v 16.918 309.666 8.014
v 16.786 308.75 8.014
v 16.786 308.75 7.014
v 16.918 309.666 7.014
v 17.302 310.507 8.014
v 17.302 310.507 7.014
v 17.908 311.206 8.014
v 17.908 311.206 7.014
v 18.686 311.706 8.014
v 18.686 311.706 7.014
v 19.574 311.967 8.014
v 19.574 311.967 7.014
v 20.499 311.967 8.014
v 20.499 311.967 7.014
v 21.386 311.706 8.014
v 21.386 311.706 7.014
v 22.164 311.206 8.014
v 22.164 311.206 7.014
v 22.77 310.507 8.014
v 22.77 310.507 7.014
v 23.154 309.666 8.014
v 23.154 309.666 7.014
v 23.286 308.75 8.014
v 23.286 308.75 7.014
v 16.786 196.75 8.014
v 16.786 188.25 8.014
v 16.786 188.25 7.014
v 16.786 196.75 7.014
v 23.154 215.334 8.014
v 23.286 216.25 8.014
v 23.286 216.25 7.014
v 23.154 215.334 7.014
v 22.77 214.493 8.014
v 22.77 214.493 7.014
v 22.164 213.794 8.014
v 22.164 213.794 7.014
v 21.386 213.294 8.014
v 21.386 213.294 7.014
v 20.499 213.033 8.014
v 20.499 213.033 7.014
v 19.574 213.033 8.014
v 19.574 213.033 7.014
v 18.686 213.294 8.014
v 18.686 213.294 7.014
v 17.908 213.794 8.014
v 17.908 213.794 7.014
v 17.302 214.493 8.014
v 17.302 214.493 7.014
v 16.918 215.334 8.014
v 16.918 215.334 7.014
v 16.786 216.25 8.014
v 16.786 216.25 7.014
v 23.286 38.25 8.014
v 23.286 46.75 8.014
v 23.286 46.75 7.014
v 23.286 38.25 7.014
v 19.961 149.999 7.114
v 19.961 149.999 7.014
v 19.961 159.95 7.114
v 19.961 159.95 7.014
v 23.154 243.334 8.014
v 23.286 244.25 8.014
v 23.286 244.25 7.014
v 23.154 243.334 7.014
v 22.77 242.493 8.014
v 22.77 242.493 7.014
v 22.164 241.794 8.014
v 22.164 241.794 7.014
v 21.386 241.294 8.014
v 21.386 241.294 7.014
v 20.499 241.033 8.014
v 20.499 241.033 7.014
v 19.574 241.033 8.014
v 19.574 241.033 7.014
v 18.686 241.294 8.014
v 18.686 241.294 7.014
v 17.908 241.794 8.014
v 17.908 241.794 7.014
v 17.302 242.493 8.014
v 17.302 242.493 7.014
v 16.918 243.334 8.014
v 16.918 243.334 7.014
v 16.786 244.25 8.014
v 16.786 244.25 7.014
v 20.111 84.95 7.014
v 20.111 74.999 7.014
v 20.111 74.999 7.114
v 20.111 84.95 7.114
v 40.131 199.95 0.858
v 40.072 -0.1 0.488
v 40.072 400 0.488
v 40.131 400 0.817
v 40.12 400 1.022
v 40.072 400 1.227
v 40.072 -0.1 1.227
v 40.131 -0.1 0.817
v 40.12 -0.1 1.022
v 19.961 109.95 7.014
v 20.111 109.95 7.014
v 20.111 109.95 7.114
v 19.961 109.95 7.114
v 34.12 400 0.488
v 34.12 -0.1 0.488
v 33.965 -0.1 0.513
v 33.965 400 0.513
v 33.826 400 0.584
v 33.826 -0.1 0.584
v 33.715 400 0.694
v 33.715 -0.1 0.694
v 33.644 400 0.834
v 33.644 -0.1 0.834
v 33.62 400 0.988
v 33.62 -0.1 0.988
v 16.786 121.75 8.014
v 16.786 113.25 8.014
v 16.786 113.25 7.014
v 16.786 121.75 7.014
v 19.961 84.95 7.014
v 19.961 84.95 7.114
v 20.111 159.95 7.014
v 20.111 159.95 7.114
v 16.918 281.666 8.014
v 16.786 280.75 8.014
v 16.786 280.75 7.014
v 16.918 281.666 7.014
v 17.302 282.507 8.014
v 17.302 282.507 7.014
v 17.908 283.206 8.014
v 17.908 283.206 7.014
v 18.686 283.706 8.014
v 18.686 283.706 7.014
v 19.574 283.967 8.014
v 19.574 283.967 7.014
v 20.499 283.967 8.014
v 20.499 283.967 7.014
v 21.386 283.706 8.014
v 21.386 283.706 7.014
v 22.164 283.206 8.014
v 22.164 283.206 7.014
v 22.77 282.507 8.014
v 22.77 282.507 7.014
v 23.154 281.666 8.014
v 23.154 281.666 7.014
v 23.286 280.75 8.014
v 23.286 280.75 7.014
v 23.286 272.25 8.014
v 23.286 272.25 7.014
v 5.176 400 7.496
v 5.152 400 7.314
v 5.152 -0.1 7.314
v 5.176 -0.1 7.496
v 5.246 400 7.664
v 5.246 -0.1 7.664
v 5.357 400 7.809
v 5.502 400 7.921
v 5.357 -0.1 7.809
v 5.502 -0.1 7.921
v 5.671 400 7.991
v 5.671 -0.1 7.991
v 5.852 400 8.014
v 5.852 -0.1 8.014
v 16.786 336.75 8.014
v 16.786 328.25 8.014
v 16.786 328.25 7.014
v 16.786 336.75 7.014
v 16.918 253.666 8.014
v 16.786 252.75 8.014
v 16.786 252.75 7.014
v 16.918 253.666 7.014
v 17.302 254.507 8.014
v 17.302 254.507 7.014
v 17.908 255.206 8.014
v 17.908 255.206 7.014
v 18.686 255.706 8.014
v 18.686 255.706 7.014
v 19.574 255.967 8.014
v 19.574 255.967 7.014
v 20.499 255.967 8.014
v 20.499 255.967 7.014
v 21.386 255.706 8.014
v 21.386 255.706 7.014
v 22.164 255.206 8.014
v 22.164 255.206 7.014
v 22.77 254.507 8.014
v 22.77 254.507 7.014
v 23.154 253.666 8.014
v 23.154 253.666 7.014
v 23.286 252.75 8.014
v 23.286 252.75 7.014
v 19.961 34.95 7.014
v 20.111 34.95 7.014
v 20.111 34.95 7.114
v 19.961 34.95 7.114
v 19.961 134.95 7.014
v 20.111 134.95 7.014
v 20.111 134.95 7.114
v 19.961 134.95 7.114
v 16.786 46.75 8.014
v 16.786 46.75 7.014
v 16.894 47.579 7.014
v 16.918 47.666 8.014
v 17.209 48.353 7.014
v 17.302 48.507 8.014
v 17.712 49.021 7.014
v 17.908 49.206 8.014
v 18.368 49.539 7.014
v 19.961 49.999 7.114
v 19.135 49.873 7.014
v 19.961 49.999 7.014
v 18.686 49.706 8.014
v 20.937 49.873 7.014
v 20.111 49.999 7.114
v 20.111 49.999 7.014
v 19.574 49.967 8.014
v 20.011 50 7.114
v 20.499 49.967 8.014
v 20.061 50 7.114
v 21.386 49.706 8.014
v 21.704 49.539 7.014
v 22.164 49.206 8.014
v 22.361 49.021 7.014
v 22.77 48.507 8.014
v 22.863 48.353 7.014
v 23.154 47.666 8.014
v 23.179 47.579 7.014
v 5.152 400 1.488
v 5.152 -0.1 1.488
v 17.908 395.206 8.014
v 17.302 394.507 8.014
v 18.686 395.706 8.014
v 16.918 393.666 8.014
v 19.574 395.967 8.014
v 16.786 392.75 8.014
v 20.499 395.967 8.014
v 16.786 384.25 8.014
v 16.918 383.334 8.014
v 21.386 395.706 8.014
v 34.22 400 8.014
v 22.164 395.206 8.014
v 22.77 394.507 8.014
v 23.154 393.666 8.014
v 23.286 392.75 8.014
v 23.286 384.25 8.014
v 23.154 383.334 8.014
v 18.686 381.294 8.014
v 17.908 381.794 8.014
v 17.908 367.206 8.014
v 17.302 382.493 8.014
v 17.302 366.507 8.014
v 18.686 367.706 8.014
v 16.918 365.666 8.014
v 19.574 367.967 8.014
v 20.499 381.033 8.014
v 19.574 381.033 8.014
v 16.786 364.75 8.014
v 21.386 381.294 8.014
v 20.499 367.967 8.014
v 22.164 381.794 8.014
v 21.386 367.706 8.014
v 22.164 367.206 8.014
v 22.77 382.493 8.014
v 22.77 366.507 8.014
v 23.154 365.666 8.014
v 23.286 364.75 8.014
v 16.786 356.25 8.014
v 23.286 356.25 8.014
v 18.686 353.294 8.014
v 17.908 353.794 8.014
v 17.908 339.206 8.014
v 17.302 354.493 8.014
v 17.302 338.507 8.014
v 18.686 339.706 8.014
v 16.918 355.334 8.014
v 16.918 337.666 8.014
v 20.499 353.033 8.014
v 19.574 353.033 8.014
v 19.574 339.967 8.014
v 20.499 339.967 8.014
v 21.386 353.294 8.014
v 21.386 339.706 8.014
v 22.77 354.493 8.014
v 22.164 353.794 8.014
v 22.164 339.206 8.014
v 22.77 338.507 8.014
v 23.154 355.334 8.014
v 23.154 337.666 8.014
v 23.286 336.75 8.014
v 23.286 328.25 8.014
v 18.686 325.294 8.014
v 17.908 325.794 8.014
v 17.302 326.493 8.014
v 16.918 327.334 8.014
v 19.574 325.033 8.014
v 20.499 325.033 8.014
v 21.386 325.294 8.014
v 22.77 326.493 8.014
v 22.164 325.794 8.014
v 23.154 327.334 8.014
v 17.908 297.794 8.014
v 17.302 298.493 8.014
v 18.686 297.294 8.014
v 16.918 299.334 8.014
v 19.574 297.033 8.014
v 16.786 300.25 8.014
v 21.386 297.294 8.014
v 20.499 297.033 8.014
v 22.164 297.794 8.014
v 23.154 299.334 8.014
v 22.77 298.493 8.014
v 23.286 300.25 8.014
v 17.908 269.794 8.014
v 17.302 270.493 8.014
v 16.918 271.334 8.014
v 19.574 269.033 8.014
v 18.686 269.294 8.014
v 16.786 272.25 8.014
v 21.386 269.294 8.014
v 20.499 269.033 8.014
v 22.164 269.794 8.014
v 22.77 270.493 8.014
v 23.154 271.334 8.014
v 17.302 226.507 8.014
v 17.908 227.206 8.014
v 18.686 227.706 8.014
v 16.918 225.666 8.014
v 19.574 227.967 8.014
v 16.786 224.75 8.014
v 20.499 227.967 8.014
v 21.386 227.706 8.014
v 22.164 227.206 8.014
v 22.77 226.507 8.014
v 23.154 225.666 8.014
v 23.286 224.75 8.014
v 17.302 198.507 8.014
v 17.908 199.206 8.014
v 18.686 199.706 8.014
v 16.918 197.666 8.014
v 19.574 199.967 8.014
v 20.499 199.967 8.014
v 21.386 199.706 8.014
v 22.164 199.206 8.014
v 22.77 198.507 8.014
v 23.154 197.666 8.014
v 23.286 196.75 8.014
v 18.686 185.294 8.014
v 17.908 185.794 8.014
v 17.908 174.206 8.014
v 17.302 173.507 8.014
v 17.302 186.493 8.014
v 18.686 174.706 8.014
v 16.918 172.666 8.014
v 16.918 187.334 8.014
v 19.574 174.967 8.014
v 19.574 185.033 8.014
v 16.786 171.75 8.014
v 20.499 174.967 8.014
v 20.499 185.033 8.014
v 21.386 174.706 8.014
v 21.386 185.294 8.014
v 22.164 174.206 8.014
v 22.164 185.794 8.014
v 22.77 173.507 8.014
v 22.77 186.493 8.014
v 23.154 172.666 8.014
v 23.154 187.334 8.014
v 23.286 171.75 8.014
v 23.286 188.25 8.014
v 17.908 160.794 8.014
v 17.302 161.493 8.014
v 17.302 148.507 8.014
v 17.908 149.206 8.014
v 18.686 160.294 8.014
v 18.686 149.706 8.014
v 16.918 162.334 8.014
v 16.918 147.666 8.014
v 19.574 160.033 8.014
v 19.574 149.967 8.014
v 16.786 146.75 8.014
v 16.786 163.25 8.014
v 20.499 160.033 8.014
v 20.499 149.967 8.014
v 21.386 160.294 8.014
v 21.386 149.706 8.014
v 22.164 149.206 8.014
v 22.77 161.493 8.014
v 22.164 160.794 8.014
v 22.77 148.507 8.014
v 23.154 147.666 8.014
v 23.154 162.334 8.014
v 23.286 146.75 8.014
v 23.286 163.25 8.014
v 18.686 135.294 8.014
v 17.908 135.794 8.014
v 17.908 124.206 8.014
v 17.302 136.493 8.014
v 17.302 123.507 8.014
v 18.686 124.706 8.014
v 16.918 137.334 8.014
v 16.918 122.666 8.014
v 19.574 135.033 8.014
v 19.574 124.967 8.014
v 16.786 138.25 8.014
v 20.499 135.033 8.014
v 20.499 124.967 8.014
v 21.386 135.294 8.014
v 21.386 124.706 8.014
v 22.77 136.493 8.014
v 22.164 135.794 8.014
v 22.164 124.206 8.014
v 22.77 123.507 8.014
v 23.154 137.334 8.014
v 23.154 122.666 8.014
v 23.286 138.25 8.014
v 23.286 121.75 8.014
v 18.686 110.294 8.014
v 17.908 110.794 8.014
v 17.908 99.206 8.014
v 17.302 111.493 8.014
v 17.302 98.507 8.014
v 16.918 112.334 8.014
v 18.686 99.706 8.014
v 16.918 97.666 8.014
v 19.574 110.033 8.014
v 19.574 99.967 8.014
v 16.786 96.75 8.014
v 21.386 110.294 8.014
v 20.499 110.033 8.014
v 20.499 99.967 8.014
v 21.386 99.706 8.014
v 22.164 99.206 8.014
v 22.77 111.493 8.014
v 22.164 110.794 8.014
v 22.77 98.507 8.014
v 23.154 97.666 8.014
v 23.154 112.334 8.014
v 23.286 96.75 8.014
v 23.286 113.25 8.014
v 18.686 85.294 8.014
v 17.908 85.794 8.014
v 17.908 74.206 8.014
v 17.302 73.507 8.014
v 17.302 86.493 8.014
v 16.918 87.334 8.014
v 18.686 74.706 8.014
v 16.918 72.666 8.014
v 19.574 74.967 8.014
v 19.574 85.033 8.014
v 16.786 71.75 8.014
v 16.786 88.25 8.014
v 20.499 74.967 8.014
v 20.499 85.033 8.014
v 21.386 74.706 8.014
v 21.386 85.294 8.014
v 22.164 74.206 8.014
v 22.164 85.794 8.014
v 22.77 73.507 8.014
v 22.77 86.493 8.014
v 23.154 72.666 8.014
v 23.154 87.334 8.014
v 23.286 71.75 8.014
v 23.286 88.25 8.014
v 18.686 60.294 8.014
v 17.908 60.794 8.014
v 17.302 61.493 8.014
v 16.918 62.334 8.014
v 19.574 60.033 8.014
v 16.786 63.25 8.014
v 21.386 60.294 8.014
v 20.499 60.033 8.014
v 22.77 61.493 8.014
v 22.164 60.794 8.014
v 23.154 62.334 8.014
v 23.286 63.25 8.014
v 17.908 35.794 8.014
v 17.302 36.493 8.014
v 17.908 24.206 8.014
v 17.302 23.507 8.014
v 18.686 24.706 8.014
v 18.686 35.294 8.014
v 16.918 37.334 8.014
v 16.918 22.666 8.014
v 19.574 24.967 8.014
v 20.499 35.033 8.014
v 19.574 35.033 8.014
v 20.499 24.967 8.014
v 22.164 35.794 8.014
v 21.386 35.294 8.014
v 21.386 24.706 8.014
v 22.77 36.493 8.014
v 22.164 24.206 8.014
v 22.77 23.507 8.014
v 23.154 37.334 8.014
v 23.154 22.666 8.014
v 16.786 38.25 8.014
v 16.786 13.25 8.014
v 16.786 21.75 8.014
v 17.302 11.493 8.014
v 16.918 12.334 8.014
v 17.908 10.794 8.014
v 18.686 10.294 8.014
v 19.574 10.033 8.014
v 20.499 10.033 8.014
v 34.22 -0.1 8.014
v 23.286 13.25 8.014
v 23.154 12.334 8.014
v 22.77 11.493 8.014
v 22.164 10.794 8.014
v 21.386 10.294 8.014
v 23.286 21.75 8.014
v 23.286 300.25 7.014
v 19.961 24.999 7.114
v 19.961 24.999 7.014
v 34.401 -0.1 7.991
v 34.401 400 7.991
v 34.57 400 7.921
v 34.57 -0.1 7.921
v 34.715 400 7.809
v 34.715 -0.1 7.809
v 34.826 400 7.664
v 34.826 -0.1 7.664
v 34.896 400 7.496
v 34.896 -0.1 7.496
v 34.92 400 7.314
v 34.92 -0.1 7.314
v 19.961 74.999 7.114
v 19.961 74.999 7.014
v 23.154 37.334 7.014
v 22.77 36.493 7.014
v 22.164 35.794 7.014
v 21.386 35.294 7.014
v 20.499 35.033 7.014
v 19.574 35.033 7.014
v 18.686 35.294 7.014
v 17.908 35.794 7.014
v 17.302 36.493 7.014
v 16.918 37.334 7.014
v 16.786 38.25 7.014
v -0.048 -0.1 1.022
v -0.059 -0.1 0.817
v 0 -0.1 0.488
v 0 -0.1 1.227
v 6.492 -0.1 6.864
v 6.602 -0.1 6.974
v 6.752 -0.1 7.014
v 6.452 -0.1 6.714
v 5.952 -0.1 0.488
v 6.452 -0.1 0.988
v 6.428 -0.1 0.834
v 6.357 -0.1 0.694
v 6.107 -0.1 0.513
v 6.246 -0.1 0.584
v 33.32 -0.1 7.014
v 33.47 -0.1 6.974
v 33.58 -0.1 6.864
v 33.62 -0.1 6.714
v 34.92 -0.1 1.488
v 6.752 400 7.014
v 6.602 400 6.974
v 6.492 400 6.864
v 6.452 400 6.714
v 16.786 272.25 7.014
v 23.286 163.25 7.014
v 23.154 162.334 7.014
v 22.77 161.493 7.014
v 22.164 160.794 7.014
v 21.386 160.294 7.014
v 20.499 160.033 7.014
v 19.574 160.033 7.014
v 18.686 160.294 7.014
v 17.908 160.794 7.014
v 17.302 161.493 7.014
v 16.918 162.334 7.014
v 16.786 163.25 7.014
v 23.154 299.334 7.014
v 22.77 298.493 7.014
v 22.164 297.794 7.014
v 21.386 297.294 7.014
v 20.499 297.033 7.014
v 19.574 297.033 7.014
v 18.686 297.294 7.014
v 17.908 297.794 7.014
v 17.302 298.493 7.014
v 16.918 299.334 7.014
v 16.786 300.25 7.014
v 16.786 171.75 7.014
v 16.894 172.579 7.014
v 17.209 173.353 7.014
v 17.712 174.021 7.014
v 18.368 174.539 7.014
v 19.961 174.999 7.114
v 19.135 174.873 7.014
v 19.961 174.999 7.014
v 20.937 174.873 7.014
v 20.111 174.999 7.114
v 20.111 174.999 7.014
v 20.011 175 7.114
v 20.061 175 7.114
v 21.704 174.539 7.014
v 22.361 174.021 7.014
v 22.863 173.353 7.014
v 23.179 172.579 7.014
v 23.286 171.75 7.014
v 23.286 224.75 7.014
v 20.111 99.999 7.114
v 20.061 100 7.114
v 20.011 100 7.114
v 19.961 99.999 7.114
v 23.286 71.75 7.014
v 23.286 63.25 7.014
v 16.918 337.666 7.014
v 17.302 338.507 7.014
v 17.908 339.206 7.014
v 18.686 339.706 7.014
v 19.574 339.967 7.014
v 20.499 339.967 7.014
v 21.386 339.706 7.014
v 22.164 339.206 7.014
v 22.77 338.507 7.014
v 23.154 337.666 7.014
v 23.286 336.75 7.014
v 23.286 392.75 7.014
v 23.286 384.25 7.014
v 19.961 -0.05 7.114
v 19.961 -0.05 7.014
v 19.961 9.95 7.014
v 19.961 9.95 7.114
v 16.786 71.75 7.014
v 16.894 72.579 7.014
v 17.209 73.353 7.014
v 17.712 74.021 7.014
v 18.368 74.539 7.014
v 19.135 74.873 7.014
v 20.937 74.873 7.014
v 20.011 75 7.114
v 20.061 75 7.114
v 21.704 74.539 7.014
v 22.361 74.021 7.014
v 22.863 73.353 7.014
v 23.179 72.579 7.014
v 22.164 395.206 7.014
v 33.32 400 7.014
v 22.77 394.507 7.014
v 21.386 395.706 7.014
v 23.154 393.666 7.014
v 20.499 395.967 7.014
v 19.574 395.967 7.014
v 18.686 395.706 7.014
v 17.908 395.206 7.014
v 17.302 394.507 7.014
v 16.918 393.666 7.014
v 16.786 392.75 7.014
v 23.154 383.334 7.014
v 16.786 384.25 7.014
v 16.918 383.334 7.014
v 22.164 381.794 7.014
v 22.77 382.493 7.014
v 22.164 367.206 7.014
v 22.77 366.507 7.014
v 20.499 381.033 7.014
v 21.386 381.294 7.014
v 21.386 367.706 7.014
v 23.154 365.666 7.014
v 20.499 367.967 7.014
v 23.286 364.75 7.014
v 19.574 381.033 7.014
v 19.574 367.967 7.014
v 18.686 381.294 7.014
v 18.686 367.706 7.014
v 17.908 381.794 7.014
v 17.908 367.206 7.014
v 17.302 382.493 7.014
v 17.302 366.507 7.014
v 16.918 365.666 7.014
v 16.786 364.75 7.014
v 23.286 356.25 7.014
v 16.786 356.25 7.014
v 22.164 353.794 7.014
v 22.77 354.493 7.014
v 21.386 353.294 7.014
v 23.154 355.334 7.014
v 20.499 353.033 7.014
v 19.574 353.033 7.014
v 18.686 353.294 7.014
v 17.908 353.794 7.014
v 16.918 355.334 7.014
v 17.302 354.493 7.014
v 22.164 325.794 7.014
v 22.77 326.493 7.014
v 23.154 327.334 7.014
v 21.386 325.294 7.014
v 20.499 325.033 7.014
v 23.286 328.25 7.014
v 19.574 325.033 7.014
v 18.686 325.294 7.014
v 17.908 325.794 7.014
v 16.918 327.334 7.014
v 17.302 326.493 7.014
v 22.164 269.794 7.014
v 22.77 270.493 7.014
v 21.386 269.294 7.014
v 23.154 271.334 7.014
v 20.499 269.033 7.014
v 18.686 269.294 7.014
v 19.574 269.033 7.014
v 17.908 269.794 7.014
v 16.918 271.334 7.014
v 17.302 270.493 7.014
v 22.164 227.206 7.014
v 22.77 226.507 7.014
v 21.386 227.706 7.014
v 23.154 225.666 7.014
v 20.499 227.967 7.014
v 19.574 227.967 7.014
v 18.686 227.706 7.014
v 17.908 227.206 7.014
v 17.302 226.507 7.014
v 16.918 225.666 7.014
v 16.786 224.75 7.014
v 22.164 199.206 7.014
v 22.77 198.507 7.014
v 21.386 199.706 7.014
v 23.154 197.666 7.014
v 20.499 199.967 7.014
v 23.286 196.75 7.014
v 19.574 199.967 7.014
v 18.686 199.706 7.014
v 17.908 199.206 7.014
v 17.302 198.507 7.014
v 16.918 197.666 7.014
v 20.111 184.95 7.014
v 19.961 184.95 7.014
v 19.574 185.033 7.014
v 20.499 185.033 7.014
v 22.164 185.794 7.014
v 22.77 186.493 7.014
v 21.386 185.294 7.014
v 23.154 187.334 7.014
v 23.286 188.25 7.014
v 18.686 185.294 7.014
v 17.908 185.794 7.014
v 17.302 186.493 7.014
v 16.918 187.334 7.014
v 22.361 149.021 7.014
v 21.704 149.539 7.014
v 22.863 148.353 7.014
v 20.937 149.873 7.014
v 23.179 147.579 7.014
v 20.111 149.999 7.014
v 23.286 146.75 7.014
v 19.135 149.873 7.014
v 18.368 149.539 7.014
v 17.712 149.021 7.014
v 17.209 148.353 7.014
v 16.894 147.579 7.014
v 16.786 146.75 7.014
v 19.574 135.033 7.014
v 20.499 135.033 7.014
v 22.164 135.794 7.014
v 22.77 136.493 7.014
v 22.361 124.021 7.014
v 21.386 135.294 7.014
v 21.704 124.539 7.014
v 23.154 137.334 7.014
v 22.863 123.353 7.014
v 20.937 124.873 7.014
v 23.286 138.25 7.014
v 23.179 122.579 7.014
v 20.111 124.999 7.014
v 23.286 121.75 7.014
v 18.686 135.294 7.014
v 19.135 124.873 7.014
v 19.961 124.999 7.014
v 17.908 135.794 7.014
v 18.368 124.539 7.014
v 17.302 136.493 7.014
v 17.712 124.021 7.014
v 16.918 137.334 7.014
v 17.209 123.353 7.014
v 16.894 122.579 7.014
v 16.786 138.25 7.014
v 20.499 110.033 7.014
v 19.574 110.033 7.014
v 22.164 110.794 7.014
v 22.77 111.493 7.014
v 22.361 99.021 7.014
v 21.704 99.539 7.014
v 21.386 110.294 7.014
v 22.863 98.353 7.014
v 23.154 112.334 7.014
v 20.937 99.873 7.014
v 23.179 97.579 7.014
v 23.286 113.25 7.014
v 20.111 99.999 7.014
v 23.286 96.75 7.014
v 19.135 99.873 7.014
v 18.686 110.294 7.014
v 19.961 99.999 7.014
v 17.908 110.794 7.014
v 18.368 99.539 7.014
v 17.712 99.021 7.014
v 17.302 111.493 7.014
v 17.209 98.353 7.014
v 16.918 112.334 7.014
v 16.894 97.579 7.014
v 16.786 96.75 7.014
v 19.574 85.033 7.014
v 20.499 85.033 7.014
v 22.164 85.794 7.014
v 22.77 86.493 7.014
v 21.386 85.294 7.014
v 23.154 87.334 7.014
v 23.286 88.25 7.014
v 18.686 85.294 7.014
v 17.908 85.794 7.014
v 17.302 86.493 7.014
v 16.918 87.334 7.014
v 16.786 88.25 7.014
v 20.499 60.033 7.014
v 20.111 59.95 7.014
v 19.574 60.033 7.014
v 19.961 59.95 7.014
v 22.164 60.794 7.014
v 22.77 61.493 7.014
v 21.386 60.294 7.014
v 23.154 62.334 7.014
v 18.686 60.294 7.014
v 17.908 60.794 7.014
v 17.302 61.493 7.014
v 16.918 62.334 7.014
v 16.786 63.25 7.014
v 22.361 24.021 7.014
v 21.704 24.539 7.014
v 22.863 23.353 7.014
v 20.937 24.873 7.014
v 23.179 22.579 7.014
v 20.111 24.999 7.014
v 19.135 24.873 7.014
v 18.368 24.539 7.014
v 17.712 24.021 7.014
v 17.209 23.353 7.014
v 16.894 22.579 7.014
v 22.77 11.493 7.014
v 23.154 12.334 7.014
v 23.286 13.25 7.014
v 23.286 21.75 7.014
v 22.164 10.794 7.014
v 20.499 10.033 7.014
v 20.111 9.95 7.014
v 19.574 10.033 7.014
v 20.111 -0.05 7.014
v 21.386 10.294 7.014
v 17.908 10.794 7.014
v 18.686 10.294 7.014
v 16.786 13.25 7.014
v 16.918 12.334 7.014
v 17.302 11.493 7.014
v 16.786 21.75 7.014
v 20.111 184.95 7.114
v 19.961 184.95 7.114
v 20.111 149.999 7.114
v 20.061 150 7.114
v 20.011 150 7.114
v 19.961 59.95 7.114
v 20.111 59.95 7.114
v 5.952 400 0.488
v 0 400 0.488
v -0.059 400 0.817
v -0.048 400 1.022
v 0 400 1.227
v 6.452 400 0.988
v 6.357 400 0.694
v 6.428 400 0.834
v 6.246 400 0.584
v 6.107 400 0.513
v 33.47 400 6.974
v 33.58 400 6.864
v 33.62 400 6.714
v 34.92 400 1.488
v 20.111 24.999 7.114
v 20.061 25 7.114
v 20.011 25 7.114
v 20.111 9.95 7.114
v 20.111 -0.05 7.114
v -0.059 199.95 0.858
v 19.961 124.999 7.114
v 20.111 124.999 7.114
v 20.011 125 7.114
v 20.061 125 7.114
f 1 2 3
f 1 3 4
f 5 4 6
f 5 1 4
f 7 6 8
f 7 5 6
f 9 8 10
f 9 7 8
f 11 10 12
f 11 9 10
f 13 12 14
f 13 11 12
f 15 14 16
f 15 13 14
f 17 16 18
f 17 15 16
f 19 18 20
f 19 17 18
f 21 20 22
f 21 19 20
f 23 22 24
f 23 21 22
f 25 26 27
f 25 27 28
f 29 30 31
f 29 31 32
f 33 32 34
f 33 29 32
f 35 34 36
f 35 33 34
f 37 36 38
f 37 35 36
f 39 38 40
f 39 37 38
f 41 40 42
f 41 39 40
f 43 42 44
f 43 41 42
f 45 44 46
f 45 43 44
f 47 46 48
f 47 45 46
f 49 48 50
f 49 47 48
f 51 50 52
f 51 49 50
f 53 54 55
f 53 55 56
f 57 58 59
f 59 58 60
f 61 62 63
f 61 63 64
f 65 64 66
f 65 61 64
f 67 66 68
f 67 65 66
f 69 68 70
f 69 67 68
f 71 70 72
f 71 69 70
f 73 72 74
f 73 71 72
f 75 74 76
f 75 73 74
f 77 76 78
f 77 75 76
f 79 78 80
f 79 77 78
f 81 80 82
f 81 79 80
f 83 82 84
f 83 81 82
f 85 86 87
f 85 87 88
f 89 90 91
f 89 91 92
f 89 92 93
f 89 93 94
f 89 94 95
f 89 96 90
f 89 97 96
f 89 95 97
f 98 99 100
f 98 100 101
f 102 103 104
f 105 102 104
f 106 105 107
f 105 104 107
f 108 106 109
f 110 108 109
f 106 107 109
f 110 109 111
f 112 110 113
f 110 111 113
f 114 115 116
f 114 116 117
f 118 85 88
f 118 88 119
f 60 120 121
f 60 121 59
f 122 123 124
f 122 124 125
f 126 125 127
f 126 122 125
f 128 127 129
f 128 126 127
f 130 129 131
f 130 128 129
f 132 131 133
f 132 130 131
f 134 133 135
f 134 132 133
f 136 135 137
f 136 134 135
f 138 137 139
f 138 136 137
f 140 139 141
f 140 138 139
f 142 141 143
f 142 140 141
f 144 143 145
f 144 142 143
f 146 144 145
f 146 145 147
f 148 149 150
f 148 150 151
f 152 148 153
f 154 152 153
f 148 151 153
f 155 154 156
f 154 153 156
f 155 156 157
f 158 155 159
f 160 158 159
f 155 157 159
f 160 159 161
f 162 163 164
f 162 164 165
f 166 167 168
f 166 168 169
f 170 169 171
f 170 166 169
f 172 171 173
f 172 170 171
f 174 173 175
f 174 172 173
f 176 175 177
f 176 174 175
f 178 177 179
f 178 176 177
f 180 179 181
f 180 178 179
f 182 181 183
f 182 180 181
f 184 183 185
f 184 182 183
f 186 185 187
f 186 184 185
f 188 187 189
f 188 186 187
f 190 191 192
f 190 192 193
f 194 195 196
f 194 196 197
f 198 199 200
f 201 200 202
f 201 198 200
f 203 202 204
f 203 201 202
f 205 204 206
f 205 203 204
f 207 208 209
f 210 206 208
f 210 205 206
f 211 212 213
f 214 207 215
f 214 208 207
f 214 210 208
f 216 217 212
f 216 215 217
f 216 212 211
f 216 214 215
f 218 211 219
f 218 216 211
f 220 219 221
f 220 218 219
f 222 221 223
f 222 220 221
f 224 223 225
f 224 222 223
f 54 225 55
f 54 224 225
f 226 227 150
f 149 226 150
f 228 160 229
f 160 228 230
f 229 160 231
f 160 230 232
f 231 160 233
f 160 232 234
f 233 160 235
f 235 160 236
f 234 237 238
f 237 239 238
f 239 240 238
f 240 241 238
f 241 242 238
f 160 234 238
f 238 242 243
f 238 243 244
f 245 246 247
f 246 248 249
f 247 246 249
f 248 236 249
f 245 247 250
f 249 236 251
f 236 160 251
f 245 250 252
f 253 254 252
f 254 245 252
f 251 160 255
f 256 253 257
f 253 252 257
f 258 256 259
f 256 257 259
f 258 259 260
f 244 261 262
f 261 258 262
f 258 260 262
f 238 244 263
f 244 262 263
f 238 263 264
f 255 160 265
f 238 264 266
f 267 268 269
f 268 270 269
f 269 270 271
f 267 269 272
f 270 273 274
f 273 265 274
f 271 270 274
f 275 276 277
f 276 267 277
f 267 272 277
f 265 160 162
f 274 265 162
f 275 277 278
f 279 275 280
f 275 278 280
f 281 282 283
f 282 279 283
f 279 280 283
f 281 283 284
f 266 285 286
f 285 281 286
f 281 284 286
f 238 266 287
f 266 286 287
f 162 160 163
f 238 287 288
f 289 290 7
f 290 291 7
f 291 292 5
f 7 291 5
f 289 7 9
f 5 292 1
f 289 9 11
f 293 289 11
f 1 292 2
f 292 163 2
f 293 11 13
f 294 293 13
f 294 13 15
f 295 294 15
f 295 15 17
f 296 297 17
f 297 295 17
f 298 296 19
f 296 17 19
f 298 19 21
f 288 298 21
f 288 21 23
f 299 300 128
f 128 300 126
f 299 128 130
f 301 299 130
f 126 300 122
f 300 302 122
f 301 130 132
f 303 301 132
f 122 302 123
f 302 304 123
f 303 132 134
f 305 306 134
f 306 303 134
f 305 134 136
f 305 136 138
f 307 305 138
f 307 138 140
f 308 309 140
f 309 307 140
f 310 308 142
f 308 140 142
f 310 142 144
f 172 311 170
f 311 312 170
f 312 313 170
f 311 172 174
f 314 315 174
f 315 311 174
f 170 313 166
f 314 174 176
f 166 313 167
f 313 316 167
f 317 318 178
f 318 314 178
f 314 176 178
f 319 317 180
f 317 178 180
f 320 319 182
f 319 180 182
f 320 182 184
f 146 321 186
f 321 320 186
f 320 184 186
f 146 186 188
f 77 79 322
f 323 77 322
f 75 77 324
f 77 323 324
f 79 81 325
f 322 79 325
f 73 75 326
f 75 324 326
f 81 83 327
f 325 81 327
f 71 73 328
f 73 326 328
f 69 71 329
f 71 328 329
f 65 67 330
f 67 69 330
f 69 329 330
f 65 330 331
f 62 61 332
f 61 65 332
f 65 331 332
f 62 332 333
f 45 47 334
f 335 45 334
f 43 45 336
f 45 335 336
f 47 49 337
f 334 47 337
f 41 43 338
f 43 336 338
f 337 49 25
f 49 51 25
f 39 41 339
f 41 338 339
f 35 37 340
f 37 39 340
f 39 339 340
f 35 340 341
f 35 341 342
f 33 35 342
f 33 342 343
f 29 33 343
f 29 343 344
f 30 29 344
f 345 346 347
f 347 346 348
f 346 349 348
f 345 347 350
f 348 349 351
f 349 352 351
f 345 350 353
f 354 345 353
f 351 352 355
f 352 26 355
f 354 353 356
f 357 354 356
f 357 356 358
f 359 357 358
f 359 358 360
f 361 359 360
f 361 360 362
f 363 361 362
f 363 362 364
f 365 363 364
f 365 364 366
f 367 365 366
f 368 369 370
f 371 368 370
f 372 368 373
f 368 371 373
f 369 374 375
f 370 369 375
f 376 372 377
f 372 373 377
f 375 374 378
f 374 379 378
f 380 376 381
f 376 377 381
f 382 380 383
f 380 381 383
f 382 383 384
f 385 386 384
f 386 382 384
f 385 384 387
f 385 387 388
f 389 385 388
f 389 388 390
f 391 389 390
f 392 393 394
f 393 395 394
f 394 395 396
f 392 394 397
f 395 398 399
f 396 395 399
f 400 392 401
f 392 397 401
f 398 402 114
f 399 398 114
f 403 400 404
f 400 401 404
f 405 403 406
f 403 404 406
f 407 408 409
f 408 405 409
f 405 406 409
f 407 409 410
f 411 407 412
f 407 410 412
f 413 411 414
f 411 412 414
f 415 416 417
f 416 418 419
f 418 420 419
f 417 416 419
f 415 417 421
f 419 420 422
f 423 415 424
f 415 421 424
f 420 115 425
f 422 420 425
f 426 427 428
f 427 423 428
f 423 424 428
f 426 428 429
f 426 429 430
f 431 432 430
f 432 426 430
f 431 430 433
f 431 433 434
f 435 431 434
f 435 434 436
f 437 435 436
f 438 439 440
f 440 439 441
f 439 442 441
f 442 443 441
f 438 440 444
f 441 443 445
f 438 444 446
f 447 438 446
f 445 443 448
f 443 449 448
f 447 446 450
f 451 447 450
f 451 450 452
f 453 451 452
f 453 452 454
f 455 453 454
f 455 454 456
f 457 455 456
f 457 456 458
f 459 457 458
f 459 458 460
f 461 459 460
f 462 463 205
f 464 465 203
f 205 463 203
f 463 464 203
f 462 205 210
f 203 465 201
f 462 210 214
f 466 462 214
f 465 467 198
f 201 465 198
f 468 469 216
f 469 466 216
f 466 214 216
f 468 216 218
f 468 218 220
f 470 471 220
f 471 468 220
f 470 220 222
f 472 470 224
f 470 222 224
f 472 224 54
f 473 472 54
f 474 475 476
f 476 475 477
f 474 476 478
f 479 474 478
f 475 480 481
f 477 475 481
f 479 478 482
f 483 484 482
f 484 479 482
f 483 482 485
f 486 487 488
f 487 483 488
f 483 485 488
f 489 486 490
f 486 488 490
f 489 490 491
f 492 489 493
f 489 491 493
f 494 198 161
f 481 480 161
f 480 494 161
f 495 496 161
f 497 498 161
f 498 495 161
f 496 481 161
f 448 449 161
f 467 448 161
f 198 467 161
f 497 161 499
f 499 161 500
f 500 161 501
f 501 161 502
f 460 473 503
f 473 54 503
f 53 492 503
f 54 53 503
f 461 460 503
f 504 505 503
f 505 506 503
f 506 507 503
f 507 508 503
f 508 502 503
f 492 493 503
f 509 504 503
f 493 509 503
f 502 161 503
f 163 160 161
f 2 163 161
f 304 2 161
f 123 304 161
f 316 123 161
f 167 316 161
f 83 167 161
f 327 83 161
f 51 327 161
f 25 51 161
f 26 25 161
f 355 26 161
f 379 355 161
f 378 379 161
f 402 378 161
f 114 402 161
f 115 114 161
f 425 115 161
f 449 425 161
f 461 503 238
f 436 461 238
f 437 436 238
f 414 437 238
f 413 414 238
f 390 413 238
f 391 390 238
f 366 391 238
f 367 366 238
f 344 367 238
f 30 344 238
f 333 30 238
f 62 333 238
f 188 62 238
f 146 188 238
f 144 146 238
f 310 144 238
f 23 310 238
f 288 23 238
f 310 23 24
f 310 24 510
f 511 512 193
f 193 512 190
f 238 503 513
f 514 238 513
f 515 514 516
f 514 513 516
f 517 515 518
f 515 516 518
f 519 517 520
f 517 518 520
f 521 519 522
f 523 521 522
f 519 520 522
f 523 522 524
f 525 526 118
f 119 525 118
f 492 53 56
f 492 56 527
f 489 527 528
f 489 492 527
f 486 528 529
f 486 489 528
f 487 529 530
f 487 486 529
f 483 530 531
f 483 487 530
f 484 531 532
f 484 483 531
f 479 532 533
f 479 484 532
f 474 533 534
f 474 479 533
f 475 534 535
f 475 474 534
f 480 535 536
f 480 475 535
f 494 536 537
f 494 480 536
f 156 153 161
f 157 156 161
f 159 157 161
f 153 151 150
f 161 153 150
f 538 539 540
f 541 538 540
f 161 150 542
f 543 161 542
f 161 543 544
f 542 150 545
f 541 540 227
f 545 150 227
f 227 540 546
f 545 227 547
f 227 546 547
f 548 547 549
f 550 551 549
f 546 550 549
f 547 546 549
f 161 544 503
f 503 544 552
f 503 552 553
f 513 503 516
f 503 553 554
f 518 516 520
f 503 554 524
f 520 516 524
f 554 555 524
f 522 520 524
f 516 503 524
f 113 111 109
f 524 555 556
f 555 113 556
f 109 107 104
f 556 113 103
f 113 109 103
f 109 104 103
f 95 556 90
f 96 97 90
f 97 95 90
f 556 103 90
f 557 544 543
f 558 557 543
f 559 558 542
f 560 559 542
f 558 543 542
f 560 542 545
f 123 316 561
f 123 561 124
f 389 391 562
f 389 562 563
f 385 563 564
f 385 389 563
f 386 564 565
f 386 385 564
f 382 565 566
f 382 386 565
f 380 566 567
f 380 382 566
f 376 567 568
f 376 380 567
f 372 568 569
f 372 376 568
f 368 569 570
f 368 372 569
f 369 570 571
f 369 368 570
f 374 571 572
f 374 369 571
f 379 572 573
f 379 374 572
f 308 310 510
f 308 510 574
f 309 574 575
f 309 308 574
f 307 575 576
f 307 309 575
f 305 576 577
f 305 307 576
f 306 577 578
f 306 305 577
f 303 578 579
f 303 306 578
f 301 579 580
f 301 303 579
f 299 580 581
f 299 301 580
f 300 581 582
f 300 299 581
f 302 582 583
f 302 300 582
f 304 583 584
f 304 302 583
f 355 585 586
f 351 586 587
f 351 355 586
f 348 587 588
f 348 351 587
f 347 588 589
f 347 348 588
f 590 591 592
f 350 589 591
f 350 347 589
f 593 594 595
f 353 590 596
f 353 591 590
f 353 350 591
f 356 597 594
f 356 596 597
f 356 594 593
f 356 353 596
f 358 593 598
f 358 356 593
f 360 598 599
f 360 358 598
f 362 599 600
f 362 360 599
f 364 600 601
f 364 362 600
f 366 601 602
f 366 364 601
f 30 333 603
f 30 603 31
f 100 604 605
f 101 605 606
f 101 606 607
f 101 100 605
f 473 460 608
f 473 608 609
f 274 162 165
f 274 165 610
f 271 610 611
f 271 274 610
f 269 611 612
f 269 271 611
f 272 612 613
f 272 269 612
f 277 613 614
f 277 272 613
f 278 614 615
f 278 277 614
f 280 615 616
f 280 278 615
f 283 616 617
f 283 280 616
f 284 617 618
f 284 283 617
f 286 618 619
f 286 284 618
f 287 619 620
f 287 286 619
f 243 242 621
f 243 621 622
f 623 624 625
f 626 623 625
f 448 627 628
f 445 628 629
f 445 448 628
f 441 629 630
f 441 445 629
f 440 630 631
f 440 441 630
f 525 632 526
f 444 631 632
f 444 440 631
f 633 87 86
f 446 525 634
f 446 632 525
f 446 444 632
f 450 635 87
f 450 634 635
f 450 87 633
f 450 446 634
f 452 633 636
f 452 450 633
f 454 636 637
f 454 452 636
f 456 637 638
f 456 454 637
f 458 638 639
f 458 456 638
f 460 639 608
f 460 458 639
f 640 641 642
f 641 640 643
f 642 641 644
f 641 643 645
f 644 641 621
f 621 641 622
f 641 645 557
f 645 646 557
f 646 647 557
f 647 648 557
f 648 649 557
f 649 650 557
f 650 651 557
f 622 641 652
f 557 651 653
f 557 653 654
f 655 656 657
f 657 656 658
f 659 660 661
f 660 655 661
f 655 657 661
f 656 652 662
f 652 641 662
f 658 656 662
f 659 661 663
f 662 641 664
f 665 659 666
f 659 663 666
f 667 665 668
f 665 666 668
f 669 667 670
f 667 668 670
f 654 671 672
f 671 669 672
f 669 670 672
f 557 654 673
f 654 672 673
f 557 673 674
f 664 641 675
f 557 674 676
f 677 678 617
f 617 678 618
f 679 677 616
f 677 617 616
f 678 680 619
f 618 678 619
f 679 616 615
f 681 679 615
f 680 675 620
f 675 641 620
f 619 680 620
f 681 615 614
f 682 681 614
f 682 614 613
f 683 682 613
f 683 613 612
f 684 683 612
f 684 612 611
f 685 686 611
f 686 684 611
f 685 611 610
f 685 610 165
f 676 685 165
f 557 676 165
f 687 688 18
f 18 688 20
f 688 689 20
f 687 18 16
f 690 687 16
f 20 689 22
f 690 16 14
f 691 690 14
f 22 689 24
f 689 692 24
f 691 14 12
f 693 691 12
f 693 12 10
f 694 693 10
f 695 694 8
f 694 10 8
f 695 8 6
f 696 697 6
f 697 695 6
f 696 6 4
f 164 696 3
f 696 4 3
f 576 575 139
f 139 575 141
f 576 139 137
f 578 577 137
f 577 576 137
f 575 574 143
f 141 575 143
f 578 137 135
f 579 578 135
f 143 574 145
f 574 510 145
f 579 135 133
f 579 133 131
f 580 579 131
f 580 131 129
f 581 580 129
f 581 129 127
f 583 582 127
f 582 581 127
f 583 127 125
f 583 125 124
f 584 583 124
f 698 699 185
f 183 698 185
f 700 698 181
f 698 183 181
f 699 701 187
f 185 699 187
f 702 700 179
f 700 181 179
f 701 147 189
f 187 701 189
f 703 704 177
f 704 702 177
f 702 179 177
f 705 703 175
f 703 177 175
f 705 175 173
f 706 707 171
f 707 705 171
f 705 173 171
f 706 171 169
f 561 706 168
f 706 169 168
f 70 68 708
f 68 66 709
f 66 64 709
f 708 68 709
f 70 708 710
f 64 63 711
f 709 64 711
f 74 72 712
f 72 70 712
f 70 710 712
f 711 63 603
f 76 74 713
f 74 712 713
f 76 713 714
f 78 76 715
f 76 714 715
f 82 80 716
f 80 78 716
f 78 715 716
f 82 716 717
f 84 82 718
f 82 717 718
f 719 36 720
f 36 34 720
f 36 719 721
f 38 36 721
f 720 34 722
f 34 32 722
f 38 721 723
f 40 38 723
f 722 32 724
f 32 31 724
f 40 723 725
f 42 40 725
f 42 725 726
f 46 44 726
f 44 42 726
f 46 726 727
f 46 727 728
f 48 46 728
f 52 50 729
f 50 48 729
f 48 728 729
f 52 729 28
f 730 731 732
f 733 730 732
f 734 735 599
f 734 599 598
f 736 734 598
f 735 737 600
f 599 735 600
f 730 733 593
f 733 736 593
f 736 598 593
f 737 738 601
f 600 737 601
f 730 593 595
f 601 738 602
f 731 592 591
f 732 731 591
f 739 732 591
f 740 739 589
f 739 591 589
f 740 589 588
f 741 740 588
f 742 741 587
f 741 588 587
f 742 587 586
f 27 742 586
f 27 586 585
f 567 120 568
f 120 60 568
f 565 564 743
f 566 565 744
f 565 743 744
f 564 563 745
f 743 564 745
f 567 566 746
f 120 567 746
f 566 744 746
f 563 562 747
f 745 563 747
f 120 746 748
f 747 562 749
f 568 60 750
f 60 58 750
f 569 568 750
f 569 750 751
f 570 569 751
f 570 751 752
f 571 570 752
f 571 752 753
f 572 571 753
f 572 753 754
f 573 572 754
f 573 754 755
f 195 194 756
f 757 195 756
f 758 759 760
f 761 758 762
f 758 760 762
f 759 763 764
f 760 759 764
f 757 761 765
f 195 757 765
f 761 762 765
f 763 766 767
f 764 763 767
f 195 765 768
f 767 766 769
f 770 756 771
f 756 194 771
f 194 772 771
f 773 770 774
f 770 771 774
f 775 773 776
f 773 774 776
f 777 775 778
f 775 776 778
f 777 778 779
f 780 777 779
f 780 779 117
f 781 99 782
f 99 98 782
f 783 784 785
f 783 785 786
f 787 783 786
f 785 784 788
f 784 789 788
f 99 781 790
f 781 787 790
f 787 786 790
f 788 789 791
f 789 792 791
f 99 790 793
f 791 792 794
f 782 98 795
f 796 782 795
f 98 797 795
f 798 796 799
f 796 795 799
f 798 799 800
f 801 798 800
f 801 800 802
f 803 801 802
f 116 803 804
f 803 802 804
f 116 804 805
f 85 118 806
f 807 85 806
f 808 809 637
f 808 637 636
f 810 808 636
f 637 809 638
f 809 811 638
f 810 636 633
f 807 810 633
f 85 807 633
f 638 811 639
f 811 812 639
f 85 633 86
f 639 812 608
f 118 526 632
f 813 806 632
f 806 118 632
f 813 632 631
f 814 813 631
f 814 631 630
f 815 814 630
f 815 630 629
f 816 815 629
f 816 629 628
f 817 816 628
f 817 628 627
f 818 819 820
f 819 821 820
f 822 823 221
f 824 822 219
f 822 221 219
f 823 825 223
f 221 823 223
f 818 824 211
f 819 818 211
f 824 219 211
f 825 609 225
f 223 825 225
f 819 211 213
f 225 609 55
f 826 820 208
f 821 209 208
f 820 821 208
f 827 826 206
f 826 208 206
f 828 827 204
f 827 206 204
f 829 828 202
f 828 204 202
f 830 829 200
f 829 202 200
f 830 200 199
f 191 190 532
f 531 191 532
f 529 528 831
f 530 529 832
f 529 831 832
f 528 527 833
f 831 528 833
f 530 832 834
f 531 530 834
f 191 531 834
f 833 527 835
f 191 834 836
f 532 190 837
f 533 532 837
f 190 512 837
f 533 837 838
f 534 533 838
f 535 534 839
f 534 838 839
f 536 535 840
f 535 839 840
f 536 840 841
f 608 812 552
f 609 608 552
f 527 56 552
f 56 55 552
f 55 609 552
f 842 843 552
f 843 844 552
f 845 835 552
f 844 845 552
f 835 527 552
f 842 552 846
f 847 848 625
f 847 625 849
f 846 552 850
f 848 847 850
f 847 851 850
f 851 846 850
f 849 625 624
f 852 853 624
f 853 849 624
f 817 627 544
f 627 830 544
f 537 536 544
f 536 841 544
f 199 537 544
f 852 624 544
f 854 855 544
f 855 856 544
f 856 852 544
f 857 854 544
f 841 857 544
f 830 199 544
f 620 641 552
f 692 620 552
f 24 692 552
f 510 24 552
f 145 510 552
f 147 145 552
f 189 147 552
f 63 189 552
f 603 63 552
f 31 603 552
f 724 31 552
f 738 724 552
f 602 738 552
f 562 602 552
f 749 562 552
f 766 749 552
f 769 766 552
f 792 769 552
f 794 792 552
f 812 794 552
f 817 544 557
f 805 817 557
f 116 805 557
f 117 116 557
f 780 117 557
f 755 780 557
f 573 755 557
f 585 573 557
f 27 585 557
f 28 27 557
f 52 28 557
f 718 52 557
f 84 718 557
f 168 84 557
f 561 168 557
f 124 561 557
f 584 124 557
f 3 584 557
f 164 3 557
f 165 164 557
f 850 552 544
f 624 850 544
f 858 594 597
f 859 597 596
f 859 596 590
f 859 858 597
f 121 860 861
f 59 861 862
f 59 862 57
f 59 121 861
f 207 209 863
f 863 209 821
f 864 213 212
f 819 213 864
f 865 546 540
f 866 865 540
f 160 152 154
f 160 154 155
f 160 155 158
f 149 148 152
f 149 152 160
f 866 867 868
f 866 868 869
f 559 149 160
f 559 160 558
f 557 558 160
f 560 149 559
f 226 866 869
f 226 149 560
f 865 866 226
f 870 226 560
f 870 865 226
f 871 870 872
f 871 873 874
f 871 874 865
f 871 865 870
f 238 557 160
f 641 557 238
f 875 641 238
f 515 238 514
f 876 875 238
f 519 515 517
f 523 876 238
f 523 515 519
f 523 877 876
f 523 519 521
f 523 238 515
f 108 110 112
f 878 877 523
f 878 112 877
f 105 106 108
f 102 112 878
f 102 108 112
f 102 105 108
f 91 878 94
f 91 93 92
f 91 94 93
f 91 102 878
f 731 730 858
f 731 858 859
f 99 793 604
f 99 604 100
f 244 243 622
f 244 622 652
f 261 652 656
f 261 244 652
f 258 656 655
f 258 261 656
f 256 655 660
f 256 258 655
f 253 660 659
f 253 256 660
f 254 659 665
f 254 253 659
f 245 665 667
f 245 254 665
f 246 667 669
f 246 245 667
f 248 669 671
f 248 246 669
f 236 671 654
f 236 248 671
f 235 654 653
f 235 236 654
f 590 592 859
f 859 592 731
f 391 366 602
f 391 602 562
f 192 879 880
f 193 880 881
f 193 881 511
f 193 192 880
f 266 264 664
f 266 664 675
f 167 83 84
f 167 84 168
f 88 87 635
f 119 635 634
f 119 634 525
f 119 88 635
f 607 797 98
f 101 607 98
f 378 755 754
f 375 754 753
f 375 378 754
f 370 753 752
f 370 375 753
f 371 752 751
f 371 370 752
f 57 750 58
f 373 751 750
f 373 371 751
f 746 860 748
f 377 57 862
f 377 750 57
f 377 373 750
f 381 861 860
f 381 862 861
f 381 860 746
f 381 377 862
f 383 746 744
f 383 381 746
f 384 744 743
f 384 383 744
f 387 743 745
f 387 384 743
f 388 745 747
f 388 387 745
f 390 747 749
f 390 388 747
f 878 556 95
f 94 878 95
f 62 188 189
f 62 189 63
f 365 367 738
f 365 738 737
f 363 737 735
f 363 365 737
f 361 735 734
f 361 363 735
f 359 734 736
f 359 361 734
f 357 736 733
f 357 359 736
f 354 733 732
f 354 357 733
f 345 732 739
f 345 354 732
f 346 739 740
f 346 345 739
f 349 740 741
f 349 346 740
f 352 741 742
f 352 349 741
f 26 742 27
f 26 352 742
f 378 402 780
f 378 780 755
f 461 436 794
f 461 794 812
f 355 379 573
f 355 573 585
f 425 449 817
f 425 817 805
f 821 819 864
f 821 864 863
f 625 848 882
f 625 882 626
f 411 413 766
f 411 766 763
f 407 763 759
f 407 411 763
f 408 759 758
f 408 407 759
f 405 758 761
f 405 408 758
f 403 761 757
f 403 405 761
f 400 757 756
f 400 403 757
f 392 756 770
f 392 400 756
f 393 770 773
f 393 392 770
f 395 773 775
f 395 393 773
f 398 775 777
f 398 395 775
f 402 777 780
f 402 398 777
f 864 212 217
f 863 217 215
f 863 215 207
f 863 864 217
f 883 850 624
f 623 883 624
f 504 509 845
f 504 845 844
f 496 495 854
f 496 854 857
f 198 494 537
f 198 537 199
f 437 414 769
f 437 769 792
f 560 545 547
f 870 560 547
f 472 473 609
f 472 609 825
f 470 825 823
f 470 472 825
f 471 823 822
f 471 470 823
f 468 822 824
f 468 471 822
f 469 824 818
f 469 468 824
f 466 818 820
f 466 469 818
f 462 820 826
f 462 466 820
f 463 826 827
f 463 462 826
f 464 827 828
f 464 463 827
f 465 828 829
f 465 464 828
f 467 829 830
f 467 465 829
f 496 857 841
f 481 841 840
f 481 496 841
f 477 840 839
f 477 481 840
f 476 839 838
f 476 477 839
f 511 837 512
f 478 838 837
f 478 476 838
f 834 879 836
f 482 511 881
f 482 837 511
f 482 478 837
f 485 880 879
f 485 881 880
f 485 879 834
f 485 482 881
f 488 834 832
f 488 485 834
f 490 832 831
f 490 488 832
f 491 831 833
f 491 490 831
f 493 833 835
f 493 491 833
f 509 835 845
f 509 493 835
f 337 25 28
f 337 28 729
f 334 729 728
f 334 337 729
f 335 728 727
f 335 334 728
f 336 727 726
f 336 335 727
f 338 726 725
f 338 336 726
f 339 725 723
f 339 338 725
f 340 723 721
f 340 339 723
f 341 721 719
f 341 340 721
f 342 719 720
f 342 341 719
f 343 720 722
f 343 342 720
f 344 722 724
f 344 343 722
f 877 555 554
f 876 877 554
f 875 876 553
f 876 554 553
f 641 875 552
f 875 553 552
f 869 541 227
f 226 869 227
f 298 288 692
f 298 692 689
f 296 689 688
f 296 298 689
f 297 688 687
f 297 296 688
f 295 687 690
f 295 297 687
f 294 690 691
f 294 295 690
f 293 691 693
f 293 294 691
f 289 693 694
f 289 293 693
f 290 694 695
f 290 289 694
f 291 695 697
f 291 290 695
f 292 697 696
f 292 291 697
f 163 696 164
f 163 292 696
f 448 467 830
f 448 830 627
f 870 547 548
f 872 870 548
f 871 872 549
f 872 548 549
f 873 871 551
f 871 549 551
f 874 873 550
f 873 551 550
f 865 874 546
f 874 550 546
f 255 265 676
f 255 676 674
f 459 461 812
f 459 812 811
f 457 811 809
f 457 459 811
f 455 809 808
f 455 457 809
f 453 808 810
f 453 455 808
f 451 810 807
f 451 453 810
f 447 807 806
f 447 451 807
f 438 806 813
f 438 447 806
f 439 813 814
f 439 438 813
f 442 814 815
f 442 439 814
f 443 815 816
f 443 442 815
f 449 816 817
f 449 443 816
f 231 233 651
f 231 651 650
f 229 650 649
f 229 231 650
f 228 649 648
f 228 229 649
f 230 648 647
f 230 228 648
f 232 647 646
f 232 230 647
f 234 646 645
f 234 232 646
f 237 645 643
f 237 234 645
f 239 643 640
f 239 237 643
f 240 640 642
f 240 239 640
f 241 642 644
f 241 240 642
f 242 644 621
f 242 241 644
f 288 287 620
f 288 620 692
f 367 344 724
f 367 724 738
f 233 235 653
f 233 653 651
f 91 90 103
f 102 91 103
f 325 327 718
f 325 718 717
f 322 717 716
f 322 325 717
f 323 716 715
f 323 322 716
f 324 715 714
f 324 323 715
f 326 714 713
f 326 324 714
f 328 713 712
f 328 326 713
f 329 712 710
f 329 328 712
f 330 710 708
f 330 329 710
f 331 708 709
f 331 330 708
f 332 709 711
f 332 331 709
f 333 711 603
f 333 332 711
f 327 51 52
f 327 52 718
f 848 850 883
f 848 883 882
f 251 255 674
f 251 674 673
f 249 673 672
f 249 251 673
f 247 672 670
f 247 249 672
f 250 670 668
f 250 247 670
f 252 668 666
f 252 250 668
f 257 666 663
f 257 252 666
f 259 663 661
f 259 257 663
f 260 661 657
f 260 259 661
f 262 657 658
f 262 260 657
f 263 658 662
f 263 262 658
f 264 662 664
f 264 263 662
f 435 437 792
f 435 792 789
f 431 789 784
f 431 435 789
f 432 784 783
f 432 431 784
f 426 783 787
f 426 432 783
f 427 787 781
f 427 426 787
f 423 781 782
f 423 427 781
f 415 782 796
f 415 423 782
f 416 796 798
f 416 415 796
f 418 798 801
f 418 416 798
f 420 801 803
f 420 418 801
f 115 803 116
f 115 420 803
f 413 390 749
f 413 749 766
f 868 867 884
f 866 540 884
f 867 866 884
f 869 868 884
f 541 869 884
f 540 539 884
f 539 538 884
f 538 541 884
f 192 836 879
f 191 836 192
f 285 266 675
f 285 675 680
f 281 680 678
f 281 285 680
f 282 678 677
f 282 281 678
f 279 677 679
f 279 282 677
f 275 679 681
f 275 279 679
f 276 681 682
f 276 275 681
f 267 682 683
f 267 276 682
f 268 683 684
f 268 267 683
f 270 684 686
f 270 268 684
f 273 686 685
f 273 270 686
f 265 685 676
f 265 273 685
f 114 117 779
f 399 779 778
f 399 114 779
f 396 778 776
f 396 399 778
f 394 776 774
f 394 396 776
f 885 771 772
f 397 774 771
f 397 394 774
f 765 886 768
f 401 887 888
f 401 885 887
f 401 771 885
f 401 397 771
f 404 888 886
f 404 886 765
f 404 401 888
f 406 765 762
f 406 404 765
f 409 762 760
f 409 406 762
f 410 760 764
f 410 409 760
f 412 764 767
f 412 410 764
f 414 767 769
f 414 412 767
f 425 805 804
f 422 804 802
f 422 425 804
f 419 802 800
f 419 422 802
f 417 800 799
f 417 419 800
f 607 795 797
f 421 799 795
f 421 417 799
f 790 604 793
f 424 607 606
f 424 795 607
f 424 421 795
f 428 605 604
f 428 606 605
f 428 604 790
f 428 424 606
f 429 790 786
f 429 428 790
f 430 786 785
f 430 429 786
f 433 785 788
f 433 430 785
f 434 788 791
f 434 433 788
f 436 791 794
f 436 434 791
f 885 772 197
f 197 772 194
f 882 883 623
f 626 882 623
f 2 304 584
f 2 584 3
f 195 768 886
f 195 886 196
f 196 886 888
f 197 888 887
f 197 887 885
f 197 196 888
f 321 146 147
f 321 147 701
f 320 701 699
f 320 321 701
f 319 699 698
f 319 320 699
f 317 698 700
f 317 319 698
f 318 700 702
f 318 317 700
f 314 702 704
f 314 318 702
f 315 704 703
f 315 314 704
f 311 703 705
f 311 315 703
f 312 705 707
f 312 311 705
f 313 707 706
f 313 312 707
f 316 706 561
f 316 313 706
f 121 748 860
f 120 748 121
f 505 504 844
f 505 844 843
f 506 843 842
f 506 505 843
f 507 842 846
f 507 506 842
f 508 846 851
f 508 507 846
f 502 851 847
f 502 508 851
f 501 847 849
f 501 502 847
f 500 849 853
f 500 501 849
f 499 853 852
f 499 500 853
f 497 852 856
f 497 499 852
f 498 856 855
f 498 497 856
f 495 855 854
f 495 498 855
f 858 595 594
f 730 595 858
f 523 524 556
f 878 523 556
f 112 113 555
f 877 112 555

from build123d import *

# Parameters (mm, degrees)
SALIENTE_EXTRUIR1_DEPTH      = 400
SALIENTE_EXTRUIR1_DEPTH_BACK = 0.1
CORTAR_EXTRUIR4_DEPTH        = 10
CROQUIS4_W                   = 0.15
CROQUIS4_H                   = 10
CORTAR_EXTRUIR9_DEPTH        = 0.1


with BuildPart() as part:
    # Croquis1 → Saliente-Extruir1 (new, two sides: drawn at the far end of the back side and taken through both)
    with BuildSketch(Plane(origin=(0, 0, 0), x_dir=(1, 0, 0), z_dir=(0, 1, 0)).offset(-SALIENTE_EXTRUIR1_DEPTH_BACK)):
        with BuildLine():
            Line((34.919955981, -1.488391566), (40.072080634, -1.226803632))
            add(Edge.make_bspline(
                [(40.072080634, -0.488391566), (40.190854748, -0.858541724), (40.072080634, -1.226803632)],
                knots=[0, 0, 0, 1, 1, 1], degree=2))
            Line((40.072080634, -0.488391566), (34.119955981, -0.488391566))
            ThreePointArc((34.119955981, -0.488391566), (33.766402591, -0.634838176), (33.619955981, -0.988391566))
            Line((33.619955981, -0.988391566), (33.619955981, -6.714416127))
            ThreePointArc((33.619955981, -6.714416127), (33.532088016, -6.926548161), (33.319955981, -7.014416127))
            Line((33.319955981, -7.014416127), (6.752124653, -7.014416127))
            ThreePointArc((6.752124653, -7.014416127), (6.539992619, -6.926548161), (6.452124653, -6.714416127))
            Line((6.452124653, -6.714416127), (6.452124653, -0.988391566))
            ThreePointArc((6.452124653, -0.988391566), (6.305678044, -0.634838176), (5.952124653, -0.488391566))
            Line((5.952124653, -0.488391566), (0, -0.488391566))
            add(Edge.make_bspline(
                [(0, -0.488391566), (-0.118774114, -0.858541724), (0, -1.226803632)],
                knots=[0, 0, 0, 1, 1, 1], degree=2))
            Line((0, -1.226803632), (5.152124653, -1.488391566))
            Line((5.152124653, -1.488391566), (5.152124653, -7.314416127))
            ThreePointArc((5.152124653, -7.314416127), (5.357149906, -7.809390874), (5.852124653, -8.014416127))
            Line((5.852124653, -8.014416127), (34.219955981, -8.014416127))
            ThreePointArc((34.219955981, -8.014416127), (34.714930728, -7.809390874), (34.919955981, -7.314416127))
            Line((34.919955981, -7.314416127), (34.919955981, -1.488391566))
        make_face()
    extrude(amount=SALIENTE_EXTRUIR1_DEPTH + SALIENTE_EXTRUIR1_DEPTH_BACK)

    # Croquis2 → Cortar-Extruir4 (cut)
    with BuildSketch(Plane.XY.offset(8.014416127)):
        with BuildLine():
            Line((16.786040317, 38.25), (16.786040317, 46.75))
            ThreePointArc((16.786040317, 46.75), (20.036040317, 50), (23.286040317, 46.75))
            Line((23.286040317, 46.75), (23.286040317, 38.25))
            ThreePointArc((23.286040317, 38.25), (20.036040317, 35), (16.786040317, 38.25))
        make_face()
        with BuildLine():
            Line((16.786040317, 13.25), (16.786040317, 21.75))
            ThreePointArc((16.786040317, 21.75), (20.036040317, 25), (23.286040317, 21.75))
            Line((23.286040317, 21.75), (23.286040317, 13.25))
            ThreePointArc((23.286040317, 13.25), (20.036040317, 10), (16.786040317, 13.25))
        make_face()
        with BuildLine():
            Line((16.786040317, 63.25), (16.786040317, 71.75))
            ThreePointArc((16.786040317, 71.75), (20.036040317, 75), (23.286040317, 71.75))
            Line((23.286040317, 71.75), (23.286040317, 63.25))
            ThreePointArc((23.286040317, 63.25), (20.036040317, 60), (16.786040317, 63.25))
        make_face()
        with BuildLine():
            Line((16.786040317, 88.25), (16.786040317, 96.75))
            ThreePointArc((16.786040317, 96.75), (20.036040317, 100), (23.286040317, 96.75))
            Line((23.286040317, 96.75), (23.286040317, 88.25))
            ThreePointArc((23.286040317, 88.25), (20.036040317, 85), (16.786040317, 88.25))
        make_face()
        with BuildLine():
            Line((16.786040317, 113.25), (16.786040317, 121.75))
            ThreePointArc((16.786040317, 121.75), (20.036040317, 125), (23.286040317, 121.75))
            Line((23.286040317, 121.75), (23.286040317, 113.25))
            ThreePointArc((23.286040317, 113.25), (20.036040317, 110), (16.786040317, 113.25))
        make_face()
        with BuildLine():
            Line((16.786040317, 138.25), (16.786040317, 146.75))
            ThreePointArc((16.786040317, 146.75), (20.036040317, 150), (23.286040317, 146.75))
            Line((23.286040317, 146.75), (23.286040317, 138.25))
            ThreePointArc((23.286040317, 138.25), (20.036040317, 135), (16.786040317, 138.25))
        make_face()
        with BuildLine():
            Line((16.786040317, 163.25), (16.786040317, 171.75))
            ThreePointArc((16.786040317, 171.75), (20.036040317, 175), (23.286040317, 171.75))
            Line((23.286040317, 171.75), (23.286040317, 163.25))
            ThreePointArc((23.286040317, 163.25), (20.036040317, 160), (16.786040317, 163.25))
        make_face()
        with BuildLine():
            Line((16.786040317, 188.25), (16.786040317, 196.75))
            ThreePointArc((16.786040317, 196.75), (20.036040317, 200), (23.286040317, 196.75))
            Line((23.286040317, 196.75), (23.286040317, 188.25))
            ThreePointArc((23.286040317, 188.25), (20.036040317, 185), (16.786040317, 188.25))
        make_face()
        with BuildLine():
            Line((16.786040317, 216.25), (16.786040317, 224.75))
            ThreePointArc((16.786040317, 224.75), (20.036040317, 228), (23.286040317, 224.75))
            Line((23.286040317, 224.75), (23.286040317, 216.25))
            ThreePointArc((23.286040317, 216.25), (20.036040317, 213), (16.786040317, 216.25))
        make_face()
        with BuildLine():
            Line((16.786040317, 244.25), (16.786040317, 252.75))
            ThreePointArc((16.786040317, 252.75), (20.036040317, 256), (23.286040317, 252.75))
            Line((23.286040317, 252.75), (23.286040317, 244.25))
            ThreePointArc((23.286040317, 244.25), (20.036040317, 241), (16.786040317, 244.25))
        make_face()
        with BuildLine():
            Line((16.786040317, 272.25), (16.786040317, 280.75))
            ThreePointArc((16.786040317, 280.75), (20.036040317, 284), (23.286040317, 280.75))
            Line((23.286040317, 280.75), (23.286040317, 272.25))
            ThreePointArc((23.286040317, 272.25), (20.036040317, 269), (16.786040317, 272.25))
        make_face()
        with BuildLine():
            Line((16.786040317, 300.25), (16.786040317, 308.75))
            ThreePointArc((16.786040317, 308.75), (20.036040317, 312), (23.286040317, 308.75))
            Line((23.286040317, 308.75), (23.286040317, 300.25))
            ThreePointArc((23.286040317, 300.25), (20.036040317, 297), (16.786040317, 300.25))
        make_face()
        with BuildLine():
            Line((16.786040317, 328.25), (16.786040317, 336.75))
            ThreePointArc((16.786040317, 336.75), (20.036040317, 340), (23.286040317, 336.75))
            Line((23.286040317, 336.75), (23.286040317, 328.25))
            ThreePointArc((23.286040317, 328.25), (20.036040317, 325), (16.786040317, 328.25))
        make_face()
        with BuildLine():
            Line((16.786040317, 356.25), (16.786040317, 364.75))
            ThreePointArc((16.786040317, 364.75), (20.036040317, 368), (23.286040317, 364.75))
            Line((23.286040317, 364.75), (23.286040317, 356.25))
            ThreePointArc((23.286040317, 356.25), (20.036040317, 353), (16.786040317, 356.25))
        make_face()
        with BuildLine():
            Line((16.786040317, 384.25), (16.786040317, 392.75))
            ThreePointArc((16.786040317, 392.75), (20.036040317, 396), (23.286040317, 392.75))
            Line((23.286040317, 392.75), (23.286040317, 384.25))
            ThreePointArc((23.286040317, 384.25), (20.036040317, 381), (16.786040317, 384.25))
        make_face()
    extrude(amount=-CORTAR_EXTRUIR4_DEPTH, mode=Mode.SUBTRACT)

    # Croquis4 → Cortar-Extruir9 (cut)
    with BuildSketch(Plane(origin=(0, 0, 7.014416127), x_dir=(-1, 0, 0), z_dir=(0, 0, -1))):
        with Locations((-20.036040317, 29.95)):
            Rectangle(CROQUIS4_W, CROQUIS4_H)
        with Locations((-20.036040317, 4.95)):
            Rectangle(CROQUIS4_W, CROQUIS4_H)
        with Locations((-20.036040317, 54.95)):
            Rectangle(CROQUIS4_W, CROQUIS4_H)
        with Locations((-20.036040317, 79.95)):
            Rectangle(CROQUIS4_W, CROQUIS4_H)
        with Locations((-20.036040317, 104.95)):
            Rectangle(CROQUIS4_W, CROQUIS4_H)
        with Locations((-20.036040317, 129.95)):
            Rectangle(CROQUIS4_W, CROQUIS4_H)
        with Locations((-20.036040317, 154.95)):
            Rectangle(CROQUIS4_W, CROQUIS4_H)
        with Locations((-20.036040317, 179.95)):
            Rectangle(CROQUIS4_W, CROQUIS4_H)
    extrude(amount=-CORTAR_EXTRUIR9_DEPTH, mode=Mode.SUBTRACT)


solid = part.part
